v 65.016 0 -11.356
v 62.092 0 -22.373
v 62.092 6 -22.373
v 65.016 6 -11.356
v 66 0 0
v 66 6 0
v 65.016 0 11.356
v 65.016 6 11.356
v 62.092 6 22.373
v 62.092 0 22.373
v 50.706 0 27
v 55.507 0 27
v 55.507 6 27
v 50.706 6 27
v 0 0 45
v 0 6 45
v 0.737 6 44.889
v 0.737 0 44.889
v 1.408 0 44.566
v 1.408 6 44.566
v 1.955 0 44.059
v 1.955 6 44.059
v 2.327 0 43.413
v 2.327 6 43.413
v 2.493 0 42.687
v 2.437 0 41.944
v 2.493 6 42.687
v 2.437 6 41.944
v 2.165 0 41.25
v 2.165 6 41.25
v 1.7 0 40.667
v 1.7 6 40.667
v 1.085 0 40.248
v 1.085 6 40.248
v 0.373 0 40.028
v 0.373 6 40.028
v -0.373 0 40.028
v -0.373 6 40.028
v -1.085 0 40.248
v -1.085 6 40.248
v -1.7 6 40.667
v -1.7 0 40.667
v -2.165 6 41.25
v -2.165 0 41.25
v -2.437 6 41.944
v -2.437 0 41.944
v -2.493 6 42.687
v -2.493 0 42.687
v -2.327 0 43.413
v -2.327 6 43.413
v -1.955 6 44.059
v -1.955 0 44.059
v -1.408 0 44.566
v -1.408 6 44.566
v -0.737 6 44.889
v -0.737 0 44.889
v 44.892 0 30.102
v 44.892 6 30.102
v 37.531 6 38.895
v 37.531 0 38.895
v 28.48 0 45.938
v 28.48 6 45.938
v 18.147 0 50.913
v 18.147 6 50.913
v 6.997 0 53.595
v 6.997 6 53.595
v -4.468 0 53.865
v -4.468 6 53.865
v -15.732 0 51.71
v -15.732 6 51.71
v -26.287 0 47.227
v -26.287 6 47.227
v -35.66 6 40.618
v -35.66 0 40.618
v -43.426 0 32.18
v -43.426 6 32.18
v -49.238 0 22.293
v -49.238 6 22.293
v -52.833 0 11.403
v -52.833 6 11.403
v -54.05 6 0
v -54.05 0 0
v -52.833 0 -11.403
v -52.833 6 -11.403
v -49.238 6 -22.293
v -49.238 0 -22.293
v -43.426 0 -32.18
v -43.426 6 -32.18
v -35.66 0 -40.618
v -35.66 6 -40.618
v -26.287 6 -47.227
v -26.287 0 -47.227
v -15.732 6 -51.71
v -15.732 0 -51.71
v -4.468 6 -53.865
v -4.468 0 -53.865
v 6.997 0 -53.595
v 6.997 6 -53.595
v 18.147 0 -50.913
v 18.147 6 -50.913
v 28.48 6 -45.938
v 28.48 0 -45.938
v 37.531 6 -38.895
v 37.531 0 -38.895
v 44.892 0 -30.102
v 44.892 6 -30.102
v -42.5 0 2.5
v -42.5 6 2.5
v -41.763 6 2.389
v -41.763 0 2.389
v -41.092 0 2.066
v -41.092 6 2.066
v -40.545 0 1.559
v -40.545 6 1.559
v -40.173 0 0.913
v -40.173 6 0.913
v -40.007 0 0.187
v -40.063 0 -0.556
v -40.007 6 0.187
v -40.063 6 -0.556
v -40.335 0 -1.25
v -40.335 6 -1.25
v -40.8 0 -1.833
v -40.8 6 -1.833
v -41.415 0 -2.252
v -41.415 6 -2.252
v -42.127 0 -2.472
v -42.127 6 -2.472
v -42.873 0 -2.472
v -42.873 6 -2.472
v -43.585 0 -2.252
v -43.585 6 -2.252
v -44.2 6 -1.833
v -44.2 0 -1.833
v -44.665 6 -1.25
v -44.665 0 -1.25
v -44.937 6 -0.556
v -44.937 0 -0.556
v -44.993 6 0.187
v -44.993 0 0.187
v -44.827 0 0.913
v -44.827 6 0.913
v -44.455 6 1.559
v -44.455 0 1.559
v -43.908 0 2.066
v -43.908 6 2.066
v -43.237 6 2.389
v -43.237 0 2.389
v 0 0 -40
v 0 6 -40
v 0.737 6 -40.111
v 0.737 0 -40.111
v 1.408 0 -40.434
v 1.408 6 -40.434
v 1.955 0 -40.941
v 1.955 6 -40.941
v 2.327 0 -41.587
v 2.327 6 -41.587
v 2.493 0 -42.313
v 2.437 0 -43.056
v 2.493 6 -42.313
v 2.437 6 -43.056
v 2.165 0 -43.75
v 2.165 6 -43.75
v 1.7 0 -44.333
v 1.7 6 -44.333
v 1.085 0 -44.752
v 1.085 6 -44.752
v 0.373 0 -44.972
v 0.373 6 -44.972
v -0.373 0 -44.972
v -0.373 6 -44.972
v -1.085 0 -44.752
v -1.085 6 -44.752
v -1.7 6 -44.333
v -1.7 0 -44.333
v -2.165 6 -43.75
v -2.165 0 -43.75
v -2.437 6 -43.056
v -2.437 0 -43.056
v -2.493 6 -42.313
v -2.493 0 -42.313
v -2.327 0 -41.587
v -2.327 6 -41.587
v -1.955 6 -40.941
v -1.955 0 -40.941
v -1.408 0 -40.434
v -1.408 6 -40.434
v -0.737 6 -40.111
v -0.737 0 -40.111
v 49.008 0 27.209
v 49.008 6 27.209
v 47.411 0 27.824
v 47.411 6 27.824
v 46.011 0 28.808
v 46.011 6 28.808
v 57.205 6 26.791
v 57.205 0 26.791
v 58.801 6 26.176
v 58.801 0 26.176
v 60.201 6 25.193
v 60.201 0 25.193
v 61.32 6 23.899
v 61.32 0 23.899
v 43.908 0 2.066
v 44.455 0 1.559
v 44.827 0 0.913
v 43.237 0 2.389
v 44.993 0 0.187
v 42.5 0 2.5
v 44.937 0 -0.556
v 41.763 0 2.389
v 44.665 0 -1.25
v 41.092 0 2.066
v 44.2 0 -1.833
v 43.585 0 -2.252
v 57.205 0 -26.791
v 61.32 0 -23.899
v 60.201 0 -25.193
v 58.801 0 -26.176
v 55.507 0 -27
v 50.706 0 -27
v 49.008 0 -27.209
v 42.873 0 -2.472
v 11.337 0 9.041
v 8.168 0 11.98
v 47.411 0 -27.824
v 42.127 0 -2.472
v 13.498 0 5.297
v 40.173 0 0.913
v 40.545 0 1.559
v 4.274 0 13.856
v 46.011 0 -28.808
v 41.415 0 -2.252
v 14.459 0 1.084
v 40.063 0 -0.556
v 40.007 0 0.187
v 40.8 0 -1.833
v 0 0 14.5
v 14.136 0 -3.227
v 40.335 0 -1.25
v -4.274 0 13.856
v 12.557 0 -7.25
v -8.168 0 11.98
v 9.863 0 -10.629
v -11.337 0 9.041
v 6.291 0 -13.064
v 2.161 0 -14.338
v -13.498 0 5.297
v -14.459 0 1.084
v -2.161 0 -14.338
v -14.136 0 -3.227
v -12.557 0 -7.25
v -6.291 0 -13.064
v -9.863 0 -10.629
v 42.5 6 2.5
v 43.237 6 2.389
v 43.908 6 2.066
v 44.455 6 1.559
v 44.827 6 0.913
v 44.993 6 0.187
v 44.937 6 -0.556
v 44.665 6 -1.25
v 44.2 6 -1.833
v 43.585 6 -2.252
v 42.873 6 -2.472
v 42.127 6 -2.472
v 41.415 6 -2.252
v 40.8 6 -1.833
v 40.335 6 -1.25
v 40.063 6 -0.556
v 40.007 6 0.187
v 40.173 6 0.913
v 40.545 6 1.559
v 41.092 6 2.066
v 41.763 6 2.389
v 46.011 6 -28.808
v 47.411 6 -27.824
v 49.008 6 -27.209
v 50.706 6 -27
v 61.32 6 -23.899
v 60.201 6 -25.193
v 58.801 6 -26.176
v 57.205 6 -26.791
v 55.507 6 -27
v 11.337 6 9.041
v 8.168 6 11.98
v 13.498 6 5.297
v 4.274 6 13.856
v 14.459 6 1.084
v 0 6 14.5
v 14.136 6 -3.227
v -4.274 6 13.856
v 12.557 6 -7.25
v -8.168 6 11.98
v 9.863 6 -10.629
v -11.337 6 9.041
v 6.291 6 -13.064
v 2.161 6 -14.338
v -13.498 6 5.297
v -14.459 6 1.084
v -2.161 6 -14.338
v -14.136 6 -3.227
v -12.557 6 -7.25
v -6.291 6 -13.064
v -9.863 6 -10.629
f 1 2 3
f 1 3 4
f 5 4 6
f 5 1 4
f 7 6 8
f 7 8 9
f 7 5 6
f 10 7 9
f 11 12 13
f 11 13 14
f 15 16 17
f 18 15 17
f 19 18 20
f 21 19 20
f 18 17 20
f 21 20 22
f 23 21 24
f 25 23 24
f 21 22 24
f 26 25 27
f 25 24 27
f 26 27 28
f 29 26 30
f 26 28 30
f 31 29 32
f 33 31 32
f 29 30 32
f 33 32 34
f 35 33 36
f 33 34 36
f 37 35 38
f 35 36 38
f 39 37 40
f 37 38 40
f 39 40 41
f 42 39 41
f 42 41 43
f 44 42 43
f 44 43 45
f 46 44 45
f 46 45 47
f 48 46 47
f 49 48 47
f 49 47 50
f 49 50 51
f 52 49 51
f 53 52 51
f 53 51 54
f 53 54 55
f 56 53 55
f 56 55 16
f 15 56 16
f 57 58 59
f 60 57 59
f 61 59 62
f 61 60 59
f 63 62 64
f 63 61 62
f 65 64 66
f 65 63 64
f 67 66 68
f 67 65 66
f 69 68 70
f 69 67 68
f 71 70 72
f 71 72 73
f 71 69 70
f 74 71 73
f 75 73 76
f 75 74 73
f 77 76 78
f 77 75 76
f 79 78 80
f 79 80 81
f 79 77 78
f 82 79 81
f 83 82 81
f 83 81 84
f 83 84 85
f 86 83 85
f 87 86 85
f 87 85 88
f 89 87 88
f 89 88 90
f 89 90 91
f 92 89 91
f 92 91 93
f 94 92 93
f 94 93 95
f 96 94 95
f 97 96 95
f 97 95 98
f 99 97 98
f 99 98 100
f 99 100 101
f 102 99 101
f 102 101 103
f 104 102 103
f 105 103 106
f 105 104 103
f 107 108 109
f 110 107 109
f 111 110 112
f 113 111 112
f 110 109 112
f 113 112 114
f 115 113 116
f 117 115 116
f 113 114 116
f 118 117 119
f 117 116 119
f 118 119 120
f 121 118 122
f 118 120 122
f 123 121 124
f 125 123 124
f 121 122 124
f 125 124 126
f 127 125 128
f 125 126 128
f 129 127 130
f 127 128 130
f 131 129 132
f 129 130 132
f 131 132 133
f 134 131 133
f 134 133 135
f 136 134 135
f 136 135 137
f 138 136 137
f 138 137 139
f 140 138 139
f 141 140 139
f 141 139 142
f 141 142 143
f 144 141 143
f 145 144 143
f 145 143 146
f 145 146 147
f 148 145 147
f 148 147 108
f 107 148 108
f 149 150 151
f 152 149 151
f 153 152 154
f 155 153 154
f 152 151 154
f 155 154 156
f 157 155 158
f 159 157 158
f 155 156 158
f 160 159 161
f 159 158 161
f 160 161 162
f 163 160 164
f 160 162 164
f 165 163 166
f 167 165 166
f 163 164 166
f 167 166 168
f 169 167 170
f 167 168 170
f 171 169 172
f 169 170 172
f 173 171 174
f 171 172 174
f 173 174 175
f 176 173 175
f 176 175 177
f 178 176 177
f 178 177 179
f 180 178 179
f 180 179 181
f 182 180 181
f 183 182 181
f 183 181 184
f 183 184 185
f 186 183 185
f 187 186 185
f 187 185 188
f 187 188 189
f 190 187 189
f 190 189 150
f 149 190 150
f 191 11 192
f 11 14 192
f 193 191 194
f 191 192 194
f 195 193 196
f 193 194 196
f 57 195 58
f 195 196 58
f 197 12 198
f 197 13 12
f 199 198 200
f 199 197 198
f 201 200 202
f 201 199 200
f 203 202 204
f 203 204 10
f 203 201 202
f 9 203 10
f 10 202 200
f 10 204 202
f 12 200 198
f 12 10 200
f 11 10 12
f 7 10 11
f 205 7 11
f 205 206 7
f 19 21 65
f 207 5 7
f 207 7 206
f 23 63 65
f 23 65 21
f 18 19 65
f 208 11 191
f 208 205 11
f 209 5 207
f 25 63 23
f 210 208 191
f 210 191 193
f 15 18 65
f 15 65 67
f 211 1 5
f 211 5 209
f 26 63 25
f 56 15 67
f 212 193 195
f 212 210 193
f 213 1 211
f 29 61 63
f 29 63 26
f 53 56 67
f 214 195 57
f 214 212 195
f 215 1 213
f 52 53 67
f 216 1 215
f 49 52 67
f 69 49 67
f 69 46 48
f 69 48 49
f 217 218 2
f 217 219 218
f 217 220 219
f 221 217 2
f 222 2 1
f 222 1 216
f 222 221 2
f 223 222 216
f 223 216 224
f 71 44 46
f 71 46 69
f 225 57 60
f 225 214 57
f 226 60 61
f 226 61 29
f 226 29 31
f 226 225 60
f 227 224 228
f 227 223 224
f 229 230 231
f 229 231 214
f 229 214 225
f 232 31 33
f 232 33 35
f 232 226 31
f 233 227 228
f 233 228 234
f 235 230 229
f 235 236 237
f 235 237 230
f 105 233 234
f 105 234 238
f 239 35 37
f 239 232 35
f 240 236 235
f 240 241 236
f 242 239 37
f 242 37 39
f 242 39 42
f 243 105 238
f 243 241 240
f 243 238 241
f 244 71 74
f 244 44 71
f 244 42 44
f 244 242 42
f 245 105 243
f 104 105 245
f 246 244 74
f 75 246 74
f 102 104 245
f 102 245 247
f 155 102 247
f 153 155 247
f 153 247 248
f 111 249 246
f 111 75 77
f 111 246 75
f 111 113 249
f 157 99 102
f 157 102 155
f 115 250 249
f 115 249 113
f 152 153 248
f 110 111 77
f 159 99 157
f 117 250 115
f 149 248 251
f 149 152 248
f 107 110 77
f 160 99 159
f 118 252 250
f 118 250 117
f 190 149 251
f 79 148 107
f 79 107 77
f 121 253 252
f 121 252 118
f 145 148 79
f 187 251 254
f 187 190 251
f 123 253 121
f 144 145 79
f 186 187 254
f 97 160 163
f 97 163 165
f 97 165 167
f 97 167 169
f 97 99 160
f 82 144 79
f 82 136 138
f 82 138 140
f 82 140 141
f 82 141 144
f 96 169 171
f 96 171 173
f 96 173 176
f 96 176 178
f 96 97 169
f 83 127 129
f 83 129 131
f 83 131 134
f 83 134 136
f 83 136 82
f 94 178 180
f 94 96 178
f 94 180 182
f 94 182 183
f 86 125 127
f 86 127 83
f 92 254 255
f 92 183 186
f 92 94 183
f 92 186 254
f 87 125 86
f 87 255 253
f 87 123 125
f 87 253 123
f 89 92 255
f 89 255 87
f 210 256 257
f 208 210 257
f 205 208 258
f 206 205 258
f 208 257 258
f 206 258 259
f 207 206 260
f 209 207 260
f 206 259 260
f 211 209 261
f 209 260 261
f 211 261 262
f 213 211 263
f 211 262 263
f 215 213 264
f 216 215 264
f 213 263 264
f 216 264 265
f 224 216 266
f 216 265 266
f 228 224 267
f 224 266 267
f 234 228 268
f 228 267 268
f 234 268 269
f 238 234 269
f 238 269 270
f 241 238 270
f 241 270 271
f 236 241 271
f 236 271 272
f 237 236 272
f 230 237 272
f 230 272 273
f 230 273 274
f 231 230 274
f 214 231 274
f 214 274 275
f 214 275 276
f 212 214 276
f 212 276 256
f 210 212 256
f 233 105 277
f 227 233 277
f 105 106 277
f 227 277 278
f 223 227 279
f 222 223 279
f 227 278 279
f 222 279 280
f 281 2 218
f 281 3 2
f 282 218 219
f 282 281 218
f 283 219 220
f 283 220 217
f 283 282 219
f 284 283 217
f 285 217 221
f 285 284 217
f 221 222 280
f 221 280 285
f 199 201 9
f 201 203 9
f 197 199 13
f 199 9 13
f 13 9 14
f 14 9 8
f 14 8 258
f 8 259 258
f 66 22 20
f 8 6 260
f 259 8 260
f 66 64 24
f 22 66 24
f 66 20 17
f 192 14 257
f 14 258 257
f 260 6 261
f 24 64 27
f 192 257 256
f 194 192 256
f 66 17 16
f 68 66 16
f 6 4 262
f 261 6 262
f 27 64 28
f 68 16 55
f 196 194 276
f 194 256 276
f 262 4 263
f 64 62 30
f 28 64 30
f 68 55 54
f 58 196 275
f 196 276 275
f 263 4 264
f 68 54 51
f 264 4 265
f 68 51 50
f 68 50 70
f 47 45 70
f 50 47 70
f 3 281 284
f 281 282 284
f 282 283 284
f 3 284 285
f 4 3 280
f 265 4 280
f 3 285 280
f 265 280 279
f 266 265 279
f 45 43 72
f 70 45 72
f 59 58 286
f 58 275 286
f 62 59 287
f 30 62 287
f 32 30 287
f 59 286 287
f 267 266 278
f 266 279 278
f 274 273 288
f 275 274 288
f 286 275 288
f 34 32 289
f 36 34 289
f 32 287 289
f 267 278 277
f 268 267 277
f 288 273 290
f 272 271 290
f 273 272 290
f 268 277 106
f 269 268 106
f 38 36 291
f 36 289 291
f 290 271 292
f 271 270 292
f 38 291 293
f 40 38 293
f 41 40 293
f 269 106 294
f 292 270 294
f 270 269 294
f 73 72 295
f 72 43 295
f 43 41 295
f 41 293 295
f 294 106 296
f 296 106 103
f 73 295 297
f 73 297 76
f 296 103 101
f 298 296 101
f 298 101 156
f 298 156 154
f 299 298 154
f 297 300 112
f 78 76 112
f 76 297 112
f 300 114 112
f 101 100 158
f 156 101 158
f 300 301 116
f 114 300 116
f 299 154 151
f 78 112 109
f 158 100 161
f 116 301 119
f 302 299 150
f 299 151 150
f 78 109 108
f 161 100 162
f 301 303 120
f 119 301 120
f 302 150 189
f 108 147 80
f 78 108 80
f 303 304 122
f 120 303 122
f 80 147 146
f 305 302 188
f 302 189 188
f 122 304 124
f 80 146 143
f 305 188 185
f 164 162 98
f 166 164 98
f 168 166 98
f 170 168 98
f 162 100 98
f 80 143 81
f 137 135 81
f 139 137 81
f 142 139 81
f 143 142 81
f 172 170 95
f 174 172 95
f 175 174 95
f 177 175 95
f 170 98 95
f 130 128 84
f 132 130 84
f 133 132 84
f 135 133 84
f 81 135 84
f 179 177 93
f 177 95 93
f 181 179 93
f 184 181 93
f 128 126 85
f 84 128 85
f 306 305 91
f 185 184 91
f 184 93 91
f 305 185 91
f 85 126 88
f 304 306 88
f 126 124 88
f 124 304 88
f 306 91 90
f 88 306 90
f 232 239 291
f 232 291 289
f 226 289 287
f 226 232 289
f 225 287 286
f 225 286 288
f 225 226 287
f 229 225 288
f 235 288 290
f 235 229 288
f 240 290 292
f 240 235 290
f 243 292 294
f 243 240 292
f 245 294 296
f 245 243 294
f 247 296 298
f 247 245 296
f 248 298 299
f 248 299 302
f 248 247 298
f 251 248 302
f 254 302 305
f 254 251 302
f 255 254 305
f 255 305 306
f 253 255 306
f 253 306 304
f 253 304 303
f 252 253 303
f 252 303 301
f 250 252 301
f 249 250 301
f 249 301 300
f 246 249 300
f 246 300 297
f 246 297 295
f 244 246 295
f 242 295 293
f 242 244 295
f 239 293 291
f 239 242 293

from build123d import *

# Parameters (mm, degrees)
SKETCH_1_R          = 14.5
EXTRUDE_1_DEPTH     = 6
SKETCH_2_R          = 2.5
CUT_EXTRUDE_1_DEPTH = 10
FILLET_1_R          = 7
FILLET_2_R          = 7


with BuildPart() as part:
    # Эскиз1 → Бобышка-Вытянуть1 (new body)
    with BuildSketch(Plane(origin=(0, 0, 0), x_dir=(1, 0, 0), z_dir=(0, 1, 0))):
        with BuildLine():
            Line((60.2245797, -27), (46.823097933, -27))
            ThreePointArc((46.823097933, -27), (-54.05, 0), (46.823097933, 27))
            Line((46.823097933, 27), (60.2245797, 27))
            ThreePointArc((60.2245797, 27), (66, 0), (60.2245797, -27))
        make_face()
        with Locations(Location((0, 0, 0), (0, 0, 270))):
            Circle(SKETCH_1_R, mode=Mode.SUBTRACT)
    extrude(amount=EXTRUDE_1_DEPTH)

    # Эскиз2 → Вырез-Вытянуть1 (cut)
    with BuildSketch(Plane(origin=(0, 6, 0), x_dir=(1, 0, 0), z_dir=(0, 1, 0))):
        with Locations(Location((0, 42.5, 0), (0, 0, 270))):
            Circle(SKETCH_2_R)
        with Locations(Location((0, -42.5, 0), (0, 0, 270))):
            Circle(SKETCH_2_R)
        with Locations(Location((-42.5, 0, 0), (0, 0, 270))):
            Circle(SKETCH_2_R)
        with Locations(Location((42.5, 0, 0), (0, 0, 270))):
            Circle(SKETCH_2_R)
    extrude(amount=-CUT_EXTRUDE_1_DEPTH, mode=Mode.SUBTRACT)

    # Скругление1
    fillet_1_edges = [part.edges().sort_by_distance(p)[0] for p in [
        (60.2245797, 3, -27),
        (60.2245797, 3, 27),
    ]]
    fillet(fillet_1_edges, radius=FILLET_1_R)

    # Скругление2
    fillet_2_edges = [part.edges().sort_by_distance(p)[0] for p in [
        (46.823097933, 3, -27),
        (46.823097933, 3, 27),
    ]]
    fillet(fillet_2_edges, radius=FILLET_2_R)


solid = part.part
